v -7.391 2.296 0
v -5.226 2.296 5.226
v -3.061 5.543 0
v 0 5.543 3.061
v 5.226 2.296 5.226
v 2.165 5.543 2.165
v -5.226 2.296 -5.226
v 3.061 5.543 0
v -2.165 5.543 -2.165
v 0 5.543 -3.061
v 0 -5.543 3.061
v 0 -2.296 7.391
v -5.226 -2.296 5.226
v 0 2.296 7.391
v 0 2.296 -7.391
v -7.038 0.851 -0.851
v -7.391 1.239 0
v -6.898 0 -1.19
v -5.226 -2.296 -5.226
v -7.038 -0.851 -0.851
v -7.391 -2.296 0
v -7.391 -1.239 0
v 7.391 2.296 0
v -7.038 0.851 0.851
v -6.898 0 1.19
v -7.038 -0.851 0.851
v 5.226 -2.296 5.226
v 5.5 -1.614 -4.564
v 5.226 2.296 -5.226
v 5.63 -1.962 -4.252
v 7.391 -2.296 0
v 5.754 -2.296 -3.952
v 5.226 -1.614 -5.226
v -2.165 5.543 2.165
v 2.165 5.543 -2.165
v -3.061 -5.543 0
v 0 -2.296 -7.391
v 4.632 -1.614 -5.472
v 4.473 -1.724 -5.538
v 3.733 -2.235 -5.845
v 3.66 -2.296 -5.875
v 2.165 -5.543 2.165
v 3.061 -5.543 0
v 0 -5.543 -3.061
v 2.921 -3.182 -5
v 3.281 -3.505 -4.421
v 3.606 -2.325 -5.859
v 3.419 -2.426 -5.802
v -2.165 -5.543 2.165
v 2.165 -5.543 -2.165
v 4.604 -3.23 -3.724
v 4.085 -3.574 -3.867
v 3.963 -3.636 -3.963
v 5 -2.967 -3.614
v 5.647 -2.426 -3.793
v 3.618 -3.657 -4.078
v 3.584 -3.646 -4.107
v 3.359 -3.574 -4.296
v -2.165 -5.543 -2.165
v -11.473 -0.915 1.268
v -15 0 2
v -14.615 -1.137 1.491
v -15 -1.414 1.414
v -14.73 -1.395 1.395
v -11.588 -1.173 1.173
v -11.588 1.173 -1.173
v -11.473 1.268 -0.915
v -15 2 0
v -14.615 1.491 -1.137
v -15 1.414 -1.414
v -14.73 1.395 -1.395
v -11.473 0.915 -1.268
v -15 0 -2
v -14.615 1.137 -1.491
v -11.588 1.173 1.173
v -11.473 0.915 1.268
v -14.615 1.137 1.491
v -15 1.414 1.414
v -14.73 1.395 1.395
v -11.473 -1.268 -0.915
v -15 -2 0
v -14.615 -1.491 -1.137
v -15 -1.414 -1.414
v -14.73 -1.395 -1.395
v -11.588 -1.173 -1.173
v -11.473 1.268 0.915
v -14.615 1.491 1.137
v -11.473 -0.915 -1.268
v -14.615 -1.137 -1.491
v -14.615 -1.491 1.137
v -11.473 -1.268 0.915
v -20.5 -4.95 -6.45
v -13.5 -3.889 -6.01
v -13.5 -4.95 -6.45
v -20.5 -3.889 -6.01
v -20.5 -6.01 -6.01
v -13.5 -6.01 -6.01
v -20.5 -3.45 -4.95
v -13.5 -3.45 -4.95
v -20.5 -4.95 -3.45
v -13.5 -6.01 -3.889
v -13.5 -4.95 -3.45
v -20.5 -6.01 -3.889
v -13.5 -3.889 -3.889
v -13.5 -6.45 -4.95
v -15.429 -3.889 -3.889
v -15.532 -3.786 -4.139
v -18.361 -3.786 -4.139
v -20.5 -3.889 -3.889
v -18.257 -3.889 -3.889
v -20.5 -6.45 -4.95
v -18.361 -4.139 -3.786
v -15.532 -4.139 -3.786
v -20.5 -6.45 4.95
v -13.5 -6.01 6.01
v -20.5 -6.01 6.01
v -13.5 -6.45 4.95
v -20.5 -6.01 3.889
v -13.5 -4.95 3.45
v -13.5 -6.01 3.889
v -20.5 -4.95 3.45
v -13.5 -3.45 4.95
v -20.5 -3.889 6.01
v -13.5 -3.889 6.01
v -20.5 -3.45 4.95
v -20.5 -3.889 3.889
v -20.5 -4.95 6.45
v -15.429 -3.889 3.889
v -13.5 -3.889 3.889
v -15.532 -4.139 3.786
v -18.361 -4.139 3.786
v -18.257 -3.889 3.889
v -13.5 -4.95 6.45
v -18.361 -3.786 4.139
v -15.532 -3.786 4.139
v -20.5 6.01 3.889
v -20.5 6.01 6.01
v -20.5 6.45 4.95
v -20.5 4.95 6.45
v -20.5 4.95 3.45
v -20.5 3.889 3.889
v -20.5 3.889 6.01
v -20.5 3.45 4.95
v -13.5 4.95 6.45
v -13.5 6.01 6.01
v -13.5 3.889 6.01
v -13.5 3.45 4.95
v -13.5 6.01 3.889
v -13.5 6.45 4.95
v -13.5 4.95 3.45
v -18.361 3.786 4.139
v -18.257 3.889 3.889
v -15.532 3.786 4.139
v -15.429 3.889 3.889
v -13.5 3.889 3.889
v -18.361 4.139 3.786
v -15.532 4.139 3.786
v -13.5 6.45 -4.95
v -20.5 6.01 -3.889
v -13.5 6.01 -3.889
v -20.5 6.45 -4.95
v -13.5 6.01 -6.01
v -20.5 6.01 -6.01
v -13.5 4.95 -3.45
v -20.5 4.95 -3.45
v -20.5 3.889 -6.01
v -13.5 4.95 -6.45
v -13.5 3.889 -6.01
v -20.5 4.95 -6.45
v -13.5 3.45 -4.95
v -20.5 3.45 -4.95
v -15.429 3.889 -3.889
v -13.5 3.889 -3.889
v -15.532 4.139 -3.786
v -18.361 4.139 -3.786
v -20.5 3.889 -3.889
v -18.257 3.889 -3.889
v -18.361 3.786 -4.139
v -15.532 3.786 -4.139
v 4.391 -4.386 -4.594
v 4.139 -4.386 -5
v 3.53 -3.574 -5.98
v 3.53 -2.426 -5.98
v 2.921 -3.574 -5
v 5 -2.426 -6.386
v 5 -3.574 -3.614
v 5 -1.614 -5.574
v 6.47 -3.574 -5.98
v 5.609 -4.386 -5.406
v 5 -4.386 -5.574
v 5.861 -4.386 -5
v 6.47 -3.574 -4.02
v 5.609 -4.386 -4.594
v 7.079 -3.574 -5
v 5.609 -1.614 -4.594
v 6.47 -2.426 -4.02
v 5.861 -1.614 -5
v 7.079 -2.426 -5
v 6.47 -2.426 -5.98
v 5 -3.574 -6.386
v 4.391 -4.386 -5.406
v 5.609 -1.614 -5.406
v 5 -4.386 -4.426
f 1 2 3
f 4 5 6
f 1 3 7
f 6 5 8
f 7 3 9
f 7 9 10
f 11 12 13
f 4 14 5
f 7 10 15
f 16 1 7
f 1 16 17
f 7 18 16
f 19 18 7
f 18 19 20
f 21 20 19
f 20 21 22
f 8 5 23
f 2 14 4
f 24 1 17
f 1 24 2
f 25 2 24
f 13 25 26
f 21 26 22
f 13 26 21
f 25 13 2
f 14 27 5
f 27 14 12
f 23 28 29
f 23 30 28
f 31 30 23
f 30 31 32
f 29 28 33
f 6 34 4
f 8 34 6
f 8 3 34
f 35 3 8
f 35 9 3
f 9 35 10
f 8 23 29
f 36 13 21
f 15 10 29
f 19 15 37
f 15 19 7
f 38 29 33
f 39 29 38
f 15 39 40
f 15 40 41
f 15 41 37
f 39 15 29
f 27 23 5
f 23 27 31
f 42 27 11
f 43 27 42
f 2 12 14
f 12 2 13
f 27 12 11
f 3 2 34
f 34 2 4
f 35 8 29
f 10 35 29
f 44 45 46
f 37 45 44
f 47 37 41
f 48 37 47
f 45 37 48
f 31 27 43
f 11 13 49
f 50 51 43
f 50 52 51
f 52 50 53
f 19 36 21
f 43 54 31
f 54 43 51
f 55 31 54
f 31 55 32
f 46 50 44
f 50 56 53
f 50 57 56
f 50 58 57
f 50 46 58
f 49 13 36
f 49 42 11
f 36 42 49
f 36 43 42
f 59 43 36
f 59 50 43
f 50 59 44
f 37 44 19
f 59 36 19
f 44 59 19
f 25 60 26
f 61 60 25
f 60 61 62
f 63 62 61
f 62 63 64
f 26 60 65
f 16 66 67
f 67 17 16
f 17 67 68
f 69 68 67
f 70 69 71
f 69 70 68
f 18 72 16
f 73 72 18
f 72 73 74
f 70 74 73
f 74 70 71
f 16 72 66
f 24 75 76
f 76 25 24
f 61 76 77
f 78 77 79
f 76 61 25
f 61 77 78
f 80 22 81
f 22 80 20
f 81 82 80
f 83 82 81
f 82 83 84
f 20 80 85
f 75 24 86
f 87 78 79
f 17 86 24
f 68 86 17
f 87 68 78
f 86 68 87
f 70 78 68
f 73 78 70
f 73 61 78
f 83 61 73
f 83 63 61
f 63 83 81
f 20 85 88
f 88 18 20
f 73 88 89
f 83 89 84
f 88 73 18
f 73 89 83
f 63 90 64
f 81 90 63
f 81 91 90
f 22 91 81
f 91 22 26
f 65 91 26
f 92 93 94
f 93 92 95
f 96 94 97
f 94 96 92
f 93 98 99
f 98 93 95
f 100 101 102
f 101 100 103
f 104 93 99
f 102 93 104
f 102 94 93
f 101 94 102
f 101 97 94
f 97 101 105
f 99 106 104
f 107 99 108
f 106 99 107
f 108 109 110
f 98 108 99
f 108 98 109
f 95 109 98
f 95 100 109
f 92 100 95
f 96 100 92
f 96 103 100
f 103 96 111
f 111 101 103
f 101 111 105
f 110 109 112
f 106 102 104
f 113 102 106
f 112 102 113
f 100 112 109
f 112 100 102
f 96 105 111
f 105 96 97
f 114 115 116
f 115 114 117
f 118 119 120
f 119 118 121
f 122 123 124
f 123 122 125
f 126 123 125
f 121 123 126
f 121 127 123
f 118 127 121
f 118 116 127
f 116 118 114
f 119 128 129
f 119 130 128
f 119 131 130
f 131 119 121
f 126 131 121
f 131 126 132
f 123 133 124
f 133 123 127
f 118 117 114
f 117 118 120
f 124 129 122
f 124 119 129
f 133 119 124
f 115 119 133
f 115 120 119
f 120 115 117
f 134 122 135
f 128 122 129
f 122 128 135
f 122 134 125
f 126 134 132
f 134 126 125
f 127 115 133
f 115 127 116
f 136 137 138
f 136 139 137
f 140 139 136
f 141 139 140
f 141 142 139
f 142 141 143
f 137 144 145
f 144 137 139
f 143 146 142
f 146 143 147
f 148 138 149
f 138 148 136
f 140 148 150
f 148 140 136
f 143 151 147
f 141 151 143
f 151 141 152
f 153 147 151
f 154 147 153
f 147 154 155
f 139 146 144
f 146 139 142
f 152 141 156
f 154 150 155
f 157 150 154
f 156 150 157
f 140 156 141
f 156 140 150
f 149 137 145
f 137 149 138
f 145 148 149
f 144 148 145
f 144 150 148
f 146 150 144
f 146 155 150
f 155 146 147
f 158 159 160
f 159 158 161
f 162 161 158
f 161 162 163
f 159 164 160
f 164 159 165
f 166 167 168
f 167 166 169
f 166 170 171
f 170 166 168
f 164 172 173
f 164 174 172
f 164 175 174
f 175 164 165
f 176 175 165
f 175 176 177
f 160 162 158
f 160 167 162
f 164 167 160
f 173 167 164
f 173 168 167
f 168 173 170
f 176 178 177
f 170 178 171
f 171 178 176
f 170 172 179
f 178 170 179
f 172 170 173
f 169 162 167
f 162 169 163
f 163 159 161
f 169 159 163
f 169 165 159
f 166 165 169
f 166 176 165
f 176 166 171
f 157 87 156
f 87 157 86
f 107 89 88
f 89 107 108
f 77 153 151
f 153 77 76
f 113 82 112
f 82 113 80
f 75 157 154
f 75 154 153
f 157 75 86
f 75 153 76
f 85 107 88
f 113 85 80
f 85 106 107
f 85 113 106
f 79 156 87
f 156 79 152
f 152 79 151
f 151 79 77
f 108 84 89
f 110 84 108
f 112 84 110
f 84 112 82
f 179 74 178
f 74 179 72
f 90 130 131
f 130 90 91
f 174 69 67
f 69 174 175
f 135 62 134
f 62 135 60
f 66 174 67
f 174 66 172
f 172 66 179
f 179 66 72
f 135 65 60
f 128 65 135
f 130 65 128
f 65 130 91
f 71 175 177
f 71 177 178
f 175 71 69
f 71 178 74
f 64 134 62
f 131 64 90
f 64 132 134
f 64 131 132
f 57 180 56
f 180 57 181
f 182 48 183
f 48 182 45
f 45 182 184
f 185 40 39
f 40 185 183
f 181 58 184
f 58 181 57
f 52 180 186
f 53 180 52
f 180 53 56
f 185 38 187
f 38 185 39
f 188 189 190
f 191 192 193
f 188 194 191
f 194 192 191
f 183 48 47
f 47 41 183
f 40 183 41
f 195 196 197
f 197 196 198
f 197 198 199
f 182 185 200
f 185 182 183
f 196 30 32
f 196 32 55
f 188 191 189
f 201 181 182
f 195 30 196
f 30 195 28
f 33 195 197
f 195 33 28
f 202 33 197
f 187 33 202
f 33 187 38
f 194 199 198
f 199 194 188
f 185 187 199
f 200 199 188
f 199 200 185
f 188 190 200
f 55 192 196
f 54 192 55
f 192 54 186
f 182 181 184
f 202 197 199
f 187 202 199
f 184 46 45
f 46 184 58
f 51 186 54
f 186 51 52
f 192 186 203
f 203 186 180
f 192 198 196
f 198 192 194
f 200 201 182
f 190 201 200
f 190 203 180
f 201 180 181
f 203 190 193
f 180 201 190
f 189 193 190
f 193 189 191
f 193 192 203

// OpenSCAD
module fin()
{
	rotate(a = 45, v = [0, 0, 1])
		difference() {
			cube(size = [10, 10, 0.5], center = true);
			translate(v = [2, 2, 0])
				cube(size = [10, 10, 2], center = true);
		}
}

module fin_pair()
{
	union() {
		fin();
		rotate(a = 90, v = [0, 1, 0])
			fin();
	}
}

module outrigger()
{
	rotate(a = 90, v = [1, 0, 0])
		cylinder(h = 7, r1 = 1.5, r2 = 1.5, center = true);
}

module outrigger_set()
{
	translate(v = [7, 0, 0])
		outrigger();
	rotate(a = 90, v = [0, 1, 0])
		translate(v = [7, 0, 0])
			outrigger();
	rotate(a = 180, v = [0, 1, 0])
		translate(v = [7, 0, 0])
			outrigger();
	rotate(a = 270, v = [0, 1, 0])
		translate(v = [7, 0, 0])
			outrigger();
}
	
module fins_plus_outriggers()
{
	union() {
		outrigger_set();
		fin_pair();
	}
}

module main_ball()
{
	scale(v = [1, 1, 0.75])
		sphere(r = 8);
}

module fuselage()
{
	translate(v = [0, 10, 0])
		rotate(a = 90, v = [1, 0, 0])
			cylinder(h = 10, r1 = 2, r2 = 1, center = true);
}

module ball_plus_fuselage()
{
	union() {
		main_ball();
		fuselage();
	}
}

module little_pod()
{
	scale(v = [1, 1.5, 1])
		sphere(r = 1.5);
}

module ship()
{
	rotate(a = -90, v = [0, 0, 1])
	union() {
		ball_plus_fuselage();
		rotate(a = 45, v = [0, 1, 0])
			translate(v = [0, 17, 0])
				fins_plus_outriggers();
		translate(v = [5, -5, -3])
			little_pod();
	}
}

$fn = 8;
rotate(a = 180, v = [0, 1, 0])
rotate(a = -90, v = [1, 0, 0])
ship();
